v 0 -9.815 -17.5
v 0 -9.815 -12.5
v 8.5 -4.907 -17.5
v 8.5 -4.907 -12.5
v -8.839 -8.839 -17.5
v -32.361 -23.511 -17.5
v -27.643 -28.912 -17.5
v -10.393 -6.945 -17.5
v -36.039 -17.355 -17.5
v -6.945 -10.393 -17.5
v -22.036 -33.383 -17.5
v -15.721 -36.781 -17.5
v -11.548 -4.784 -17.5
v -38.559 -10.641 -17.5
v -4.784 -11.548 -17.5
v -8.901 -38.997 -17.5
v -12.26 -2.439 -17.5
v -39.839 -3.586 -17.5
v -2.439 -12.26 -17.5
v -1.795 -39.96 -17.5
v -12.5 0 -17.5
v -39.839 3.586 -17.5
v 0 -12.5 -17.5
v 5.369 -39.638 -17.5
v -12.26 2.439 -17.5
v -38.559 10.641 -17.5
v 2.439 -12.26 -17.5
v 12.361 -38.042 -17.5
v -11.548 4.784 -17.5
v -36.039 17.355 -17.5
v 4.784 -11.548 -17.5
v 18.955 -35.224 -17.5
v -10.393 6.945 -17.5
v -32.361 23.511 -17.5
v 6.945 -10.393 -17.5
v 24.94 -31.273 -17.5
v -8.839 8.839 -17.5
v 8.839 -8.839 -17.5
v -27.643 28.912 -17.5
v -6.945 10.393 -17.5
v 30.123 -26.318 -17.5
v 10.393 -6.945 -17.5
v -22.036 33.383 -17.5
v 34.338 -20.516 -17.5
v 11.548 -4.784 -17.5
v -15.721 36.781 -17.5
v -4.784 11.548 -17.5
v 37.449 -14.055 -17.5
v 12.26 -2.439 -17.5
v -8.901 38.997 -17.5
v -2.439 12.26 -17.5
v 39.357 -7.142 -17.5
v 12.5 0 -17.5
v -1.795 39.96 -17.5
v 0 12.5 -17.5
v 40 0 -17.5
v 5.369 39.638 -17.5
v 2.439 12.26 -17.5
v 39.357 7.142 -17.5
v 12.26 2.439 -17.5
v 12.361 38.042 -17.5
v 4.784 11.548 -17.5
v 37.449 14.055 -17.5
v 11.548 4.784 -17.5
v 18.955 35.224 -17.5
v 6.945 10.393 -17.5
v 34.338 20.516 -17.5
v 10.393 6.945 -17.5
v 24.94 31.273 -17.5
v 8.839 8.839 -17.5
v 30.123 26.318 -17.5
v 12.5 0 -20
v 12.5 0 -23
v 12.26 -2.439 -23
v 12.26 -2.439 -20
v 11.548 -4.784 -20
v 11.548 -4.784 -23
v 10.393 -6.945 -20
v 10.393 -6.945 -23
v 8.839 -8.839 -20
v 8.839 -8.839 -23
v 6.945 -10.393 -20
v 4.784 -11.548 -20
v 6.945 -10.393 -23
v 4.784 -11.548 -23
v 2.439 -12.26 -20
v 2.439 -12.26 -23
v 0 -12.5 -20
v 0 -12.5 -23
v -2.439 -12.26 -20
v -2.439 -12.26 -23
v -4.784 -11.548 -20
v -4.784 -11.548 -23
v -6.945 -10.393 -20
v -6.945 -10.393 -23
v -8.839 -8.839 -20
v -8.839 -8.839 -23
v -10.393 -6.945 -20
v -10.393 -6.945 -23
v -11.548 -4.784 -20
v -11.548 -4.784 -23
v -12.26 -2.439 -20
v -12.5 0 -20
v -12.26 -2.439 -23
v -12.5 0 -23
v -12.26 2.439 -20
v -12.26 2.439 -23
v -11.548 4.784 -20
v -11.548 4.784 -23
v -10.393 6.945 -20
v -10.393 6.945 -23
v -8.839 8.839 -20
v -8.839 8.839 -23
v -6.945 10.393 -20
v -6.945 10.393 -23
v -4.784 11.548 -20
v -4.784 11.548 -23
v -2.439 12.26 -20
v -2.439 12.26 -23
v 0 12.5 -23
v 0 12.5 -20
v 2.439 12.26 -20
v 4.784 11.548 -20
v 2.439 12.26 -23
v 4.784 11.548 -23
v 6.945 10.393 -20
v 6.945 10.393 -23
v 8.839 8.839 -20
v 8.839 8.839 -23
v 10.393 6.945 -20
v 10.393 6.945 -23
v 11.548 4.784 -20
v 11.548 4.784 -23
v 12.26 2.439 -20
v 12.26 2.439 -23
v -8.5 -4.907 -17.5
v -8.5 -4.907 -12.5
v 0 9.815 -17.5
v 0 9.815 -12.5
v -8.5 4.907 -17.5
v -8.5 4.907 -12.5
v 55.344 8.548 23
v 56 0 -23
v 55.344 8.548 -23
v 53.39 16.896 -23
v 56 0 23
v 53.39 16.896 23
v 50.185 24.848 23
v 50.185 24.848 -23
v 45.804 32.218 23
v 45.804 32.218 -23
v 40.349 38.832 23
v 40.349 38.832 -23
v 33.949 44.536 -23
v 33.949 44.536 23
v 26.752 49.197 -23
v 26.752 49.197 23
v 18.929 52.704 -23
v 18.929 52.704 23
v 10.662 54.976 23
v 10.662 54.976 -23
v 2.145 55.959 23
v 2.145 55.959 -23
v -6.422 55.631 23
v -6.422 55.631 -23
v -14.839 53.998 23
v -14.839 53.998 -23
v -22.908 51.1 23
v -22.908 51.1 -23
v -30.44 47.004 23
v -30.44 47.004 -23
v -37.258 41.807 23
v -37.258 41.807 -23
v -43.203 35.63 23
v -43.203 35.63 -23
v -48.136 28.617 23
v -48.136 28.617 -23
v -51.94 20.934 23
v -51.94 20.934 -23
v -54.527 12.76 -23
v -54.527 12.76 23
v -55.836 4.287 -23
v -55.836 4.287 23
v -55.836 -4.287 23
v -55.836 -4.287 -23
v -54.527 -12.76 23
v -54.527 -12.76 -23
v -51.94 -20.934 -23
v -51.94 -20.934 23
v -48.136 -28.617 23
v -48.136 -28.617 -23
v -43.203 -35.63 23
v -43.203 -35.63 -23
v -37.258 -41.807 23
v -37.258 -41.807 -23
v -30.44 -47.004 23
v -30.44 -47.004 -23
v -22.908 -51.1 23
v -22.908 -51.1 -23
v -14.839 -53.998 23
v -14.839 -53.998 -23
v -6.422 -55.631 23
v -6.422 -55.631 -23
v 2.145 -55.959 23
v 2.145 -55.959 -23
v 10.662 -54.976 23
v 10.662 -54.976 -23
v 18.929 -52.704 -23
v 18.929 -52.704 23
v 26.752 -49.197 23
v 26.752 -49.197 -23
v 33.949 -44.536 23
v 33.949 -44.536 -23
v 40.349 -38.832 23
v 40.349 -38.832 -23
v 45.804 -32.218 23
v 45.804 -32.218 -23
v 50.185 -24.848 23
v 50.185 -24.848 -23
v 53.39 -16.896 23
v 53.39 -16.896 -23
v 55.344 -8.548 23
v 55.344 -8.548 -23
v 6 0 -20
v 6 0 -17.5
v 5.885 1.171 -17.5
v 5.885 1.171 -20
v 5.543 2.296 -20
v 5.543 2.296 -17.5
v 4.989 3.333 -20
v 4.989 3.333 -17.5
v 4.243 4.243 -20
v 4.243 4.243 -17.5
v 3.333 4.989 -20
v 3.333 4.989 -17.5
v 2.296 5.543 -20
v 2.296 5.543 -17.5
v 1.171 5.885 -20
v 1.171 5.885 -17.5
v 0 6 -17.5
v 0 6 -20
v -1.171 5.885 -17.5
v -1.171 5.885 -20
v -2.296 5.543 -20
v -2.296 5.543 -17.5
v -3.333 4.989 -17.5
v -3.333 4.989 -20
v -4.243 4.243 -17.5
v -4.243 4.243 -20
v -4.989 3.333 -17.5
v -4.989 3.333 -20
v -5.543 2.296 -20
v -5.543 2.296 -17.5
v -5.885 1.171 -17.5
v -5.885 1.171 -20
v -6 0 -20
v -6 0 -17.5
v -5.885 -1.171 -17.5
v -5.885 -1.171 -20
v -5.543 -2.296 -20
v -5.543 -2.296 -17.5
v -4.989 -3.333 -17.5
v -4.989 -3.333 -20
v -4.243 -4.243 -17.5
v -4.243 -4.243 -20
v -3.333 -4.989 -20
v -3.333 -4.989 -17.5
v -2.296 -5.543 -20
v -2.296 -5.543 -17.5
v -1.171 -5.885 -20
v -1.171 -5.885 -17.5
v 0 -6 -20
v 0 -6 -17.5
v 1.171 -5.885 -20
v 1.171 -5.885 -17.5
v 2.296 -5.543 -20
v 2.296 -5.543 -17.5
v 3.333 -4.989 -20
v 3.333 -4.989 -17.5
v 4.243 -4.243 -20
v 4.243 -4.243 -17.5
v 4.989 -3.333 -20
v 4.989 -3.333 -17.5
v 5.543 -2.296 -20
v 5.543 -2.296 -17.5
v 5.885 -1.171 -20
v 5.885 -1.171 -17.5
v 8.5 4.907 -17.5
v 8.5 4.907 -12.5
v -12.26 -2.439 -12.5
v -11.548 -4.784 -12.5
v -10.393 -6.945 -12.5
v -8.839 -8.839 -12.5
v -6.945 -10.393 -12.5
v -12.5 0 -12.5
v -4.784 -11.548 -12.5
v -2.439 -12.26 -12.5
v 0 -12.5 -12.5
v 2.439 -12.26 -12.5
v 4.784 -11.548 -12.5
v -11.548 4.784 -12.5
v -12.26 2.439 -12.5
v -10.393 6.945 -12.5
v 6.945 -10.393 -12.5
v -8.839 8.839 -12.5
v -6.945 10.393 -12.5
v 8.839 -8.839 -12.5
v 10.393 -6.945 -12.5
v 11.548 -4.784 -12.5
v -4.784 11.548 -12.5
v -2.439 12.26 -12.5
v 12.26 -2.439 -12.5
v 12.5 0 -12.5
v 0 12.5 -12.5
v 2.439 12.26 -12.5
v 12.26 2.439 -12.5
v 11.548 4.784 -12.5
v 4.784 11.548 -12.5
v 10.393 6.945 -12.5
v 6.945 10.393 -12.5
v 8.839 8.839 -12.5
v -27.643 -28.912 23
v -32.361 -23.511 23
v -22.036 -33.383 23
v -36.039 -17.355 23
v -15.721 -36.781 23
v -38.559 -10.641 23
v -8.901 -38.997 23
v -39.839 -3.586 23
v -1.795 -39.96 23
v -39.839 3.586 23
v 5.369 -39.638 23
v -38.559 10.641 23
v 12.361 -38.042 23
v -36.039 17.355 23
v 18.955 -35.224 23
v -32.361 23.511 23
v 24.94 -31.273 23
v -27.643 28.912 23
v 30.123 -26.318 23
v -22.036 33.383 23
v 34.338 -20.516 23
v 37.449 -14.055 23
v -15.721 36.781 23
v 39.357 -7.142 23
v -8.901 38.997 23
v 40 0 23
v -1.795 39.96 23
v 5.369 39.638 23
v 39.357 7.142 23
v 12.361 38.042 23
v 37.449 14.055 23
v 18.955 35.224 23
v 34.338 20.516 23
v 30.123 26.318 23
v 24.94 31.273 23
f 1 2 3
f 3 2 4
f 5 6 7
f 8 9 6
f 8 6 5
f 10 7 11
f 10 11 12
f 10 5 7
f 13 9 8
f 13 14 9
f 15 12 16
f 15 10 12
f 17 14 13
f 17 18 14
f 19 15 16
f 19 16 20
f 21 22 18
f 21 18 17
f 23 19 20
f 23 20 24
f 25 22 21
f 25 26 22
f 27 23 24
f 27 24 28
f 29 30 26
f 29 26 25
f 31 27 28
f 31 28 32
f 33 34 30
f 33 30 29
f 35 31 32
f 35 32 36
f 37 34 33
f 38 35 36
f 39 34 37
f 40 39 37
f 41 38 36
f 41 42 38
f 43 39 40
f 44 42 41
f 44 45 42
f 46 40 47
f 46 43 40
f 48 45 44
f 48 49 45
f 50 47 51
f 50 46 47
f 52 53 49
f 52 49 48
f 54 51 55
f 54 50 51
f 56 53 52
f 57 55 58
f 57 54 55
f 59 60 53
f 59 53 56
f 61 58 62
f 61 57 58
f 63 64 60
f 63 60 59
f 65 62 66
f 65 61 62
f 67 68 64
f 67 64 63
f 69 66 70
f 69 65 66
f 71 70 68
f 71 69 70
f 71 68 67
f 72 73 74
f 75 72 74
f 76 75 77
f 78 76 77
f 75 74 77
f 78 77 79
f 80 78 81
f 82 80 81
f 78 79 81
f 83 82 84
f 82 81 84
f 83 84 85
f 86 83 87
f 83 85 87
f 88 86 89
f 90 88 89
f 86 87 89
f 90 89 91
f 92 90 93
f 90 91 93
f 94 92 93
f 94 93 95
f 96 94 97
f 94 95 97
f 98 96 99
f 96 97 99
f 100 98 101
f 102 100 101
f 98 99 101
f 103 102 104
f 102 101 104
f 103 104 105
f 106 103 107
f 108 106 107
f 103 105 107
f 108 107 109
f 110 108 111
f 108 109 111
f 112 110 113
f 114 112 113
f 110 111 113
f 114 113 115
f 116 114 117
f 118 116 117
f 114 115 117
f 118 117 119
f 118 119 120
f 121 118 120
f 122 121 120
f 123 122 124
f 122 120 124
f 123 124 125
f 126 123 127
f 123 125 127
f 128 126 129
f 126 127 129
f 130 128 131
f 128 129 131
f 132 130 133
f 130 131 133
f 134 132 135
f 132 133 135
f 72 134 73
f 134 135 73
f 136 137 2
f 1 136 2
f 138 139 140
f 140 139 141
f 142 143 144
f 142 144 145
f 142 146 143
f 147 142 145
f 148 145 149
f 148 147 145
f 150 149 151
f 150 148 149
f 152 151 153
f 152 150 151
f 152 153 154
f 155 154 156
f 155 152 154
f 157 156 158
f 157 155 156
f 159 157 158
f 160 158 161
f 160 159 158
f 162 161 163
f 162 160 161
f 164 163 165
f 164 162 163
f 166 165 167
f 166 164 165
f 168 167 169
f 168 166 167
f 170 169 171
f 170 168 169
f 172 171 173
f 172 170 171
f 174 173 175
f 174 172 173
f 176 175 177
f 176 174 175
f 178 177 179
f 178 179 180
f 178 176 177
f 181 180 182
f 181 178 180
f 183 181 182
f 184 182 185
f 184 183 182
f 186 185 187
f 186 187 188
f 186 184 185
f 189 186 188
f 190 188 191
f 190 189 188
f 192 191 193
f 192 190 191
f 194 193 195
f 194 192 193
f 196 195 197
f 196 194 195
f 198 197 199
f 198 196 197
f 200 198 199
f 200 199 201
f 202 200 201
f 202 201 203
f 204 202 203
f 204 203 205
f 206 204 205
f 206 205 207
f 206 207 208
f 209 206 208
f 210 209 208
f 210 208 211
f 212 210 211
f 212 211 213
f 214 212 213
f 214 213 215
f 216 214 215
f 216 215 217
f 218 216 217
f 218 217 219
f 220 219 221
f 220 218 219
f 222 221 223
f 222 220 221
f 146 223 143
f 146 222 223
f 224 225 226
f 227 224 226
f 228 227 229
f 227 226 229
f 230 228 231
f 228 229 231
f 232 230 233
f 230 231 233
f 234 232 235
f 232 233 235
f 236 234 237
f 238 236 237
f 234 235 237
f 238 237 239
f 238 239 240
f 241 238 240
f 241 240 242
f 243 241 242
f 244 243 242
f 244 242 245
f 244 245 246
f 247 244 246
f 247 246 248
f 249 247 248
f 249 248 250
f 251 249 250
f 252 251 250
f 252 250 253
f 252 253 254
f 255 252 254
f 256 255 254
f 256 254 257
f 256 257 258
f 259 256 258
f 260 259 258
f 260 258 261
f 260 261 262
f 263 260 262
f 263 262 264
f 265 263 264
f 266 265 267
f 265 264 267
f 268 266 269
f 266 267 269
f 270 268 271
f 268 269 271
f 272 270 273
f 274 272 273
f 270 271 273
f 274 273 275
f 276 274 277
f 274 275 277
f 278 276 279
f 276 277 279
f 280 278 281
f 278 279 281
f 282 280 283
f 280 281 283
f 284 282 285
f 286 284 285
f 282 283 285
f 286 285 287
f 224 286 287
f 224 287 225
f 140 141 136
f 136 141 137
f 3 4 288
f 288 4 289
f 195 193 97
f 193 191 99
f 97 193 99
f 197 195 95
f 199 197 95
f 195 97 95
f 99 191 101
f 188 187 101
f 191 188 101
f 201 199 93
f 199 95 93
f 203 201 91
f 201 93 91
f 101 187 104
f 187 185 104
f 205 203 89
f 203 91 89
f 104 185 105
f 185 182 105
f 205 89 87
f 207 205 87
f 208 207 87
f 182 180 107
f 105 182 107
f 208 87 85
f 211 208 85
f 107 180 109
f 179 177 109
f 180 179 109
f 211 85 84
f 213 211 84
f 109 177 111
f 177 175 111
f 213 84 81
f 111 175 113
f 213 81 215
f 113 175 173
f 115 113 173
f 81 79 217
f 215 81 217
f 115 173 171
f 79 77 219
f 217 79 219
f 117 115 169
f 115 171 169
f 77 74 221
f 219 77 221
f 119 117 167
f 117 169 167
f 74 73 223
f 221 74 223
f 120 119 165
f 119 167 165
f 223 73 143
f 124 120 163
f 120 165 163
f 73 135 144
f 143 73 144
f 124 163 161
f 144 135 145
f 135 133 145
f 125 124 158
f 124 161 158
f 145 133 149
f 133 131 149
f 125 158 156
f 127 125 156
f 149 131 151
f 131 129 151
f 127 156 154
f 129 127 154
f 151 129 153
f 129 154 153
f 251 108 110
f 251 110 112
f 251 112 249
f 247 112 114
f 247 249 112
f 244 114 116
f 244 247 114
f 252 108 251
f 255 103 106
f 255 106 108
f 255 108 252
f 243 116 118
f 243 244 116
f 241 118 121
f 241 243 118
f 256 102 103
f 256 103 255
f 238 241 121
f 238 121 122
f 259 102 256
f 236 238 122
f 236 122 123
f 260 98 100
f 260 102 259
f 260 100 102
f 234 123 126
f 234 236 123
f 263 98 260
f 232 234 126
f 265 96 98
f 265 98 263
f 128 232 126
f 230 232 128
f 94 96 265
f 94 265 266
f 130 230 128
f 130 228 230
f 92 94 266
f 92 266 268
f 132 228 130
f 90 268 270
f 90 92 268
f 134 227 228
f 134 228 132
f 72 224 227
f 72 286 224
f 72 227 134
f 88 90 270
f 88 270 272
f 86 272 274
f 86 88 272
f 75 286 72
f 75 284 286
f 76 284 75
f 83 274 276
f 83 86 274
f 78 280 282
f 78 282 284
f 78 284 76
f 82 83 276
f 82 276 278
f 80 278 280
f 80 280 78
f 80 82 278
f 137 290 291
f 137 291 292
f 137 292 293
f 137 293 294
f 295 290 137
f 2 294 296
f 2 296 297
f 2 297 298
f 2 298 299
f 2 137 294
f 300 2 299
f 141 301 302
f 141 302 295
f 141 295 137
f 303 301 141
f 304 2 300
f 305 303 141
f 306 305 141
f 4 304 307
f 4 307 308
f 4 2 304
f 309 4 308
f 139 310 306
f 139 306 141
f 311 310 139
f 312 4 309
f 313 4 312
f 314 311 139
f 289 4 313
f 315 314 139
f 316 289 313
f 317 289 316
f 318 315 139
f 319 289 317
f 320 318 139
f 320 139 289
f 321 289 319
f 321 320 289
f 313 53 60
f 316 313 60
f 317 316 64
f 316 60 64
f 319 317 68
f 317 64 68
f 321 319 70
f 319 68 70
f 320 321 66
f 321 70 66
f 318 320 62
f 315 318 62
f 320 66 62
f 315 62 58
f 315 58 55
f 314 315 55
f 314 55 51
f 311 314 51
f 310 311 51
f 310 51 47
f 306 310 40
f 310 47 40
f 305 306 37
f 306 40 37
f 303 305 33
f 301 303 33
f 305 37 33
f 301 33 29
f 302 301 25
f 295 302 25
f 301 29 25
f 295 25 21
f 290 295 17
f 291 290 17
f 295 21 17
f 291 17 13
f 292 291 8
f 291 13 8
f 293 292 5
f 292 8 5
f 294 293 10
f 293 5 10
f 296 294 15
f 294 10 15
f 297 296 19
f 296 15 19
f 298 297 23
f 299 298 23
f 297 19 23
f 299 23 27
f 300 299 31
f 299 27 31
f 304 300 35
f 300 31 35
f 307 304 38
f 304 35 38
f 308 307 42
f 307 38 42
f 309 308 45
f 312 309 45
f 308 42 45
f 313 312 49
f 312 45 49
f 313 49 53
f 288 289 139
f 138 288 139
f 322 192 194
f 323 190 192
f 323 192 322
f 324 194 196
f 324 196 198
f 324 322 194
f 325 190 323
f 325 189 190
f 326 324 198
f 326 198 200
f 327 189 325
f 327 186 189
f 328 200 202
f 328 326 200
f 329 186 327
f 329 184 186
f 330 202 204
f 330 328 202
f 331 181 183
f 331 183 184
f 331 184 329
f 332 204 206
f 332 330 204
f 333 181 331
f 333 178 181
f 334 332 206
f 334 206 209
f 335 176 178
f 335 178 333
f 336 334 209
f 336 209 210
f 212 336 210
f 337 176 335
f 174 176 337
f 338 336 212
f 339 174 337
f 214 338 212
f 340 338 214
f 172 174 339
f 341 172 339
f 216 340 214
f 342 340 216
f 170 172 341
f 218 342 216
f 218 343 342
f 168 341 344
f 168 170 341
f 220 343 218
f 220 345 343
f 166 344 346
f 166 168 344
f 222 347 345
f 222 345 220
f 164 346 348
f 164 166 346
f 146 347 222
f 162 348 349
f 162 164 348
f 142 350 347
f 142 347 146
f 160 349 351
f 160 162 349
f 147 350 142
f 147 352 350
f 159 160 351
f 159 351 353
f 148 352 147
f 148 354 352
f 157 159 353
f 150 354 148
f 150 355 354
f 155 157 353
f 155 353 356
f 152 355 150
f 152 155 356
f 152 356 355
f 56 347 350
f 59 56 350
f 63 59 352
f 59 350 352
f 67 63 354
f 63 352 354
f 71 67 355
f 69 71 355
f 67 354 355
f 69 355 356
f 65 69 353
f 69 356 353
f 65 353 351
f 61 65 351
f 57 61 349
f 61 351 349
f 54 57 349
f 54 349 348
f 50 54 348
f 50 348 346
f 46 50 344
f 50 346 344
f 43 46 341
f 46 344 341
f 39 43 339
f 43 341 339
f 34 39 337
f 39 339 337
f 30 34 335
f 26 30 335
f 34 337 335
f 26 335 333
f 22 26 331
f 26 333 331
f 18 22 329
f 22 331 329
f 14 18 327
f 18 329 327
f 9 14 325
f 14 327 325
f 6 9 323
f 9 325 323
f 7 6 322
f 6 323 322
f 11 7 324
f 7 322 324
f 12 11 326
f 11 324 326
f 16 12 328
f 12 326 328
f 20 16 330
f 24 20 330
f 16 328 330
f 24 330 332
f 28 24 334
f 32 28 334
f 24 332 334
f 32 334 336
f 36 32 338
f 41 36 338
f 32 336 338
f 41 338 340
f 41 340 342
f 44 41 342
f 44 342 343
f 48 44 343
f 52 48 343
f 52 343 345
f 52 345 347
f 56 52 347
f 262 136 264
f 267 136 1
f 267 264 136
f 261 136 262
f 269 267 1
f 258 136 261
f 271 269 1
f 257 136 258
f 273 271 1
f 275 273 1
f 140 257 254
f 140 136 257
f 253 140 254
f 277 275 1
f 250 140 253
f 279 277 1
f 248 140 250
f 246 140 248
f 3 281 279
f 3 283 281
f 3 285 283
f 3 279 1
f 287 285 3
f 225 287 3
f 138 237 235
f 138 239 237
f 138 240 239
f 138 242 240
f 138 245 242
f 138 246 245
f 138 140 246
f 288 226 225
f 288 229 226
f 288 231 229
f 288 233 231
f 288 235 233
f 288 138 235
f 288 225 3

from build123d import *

# Parameters (mm, degrees)
CROQUIS1_R              = 56
SALIENTE_EXTRUIR1_DEPTH = 23
CROQUIS2_R              = 40
CORTAR_EXTRUIR1_DEPTH   = 40.5
CROQUIS3_R              = 12.5
SALIENTE_EXTRUIR2_DEPTH = 5
CORTAR_EXTRUIR2_DEPTH   = 5
CROQUIS5_R              = 6
CORTAR_EXTRUIR3_DEPTH   = 89.950829114
CROQUIS6_R              = 12.5
CORTAR_EXTRUIR4_DEPTH   = 3


with BuildPart() as part:
    # Croquis1 → Saliente-Extruir1 (new, symmetric)
    with BuildSketch(Plane.XY):
        Circle(CROQUIS1_R)
    extrude(amount=SALIENTE_EXTRUIR1_DEPTH, both=True)

    # Croquis2 → Cortar-Extruir1 (cut)
    with BuildSketch(Plane.XY.offset(23)):
        Circle(CROQUIS2_R)
    extrude(amount=-CORTAR_EXTRUIR1_DEPTH, mode=Mode.SUBTRACT)

    # Croquis3 → Saliente-Extruir2 (add)
    with BuildSketch(Plane.XY.offset(-17.5)):
        Circle(CROQUIS3_R)
    extrude(amount=SALIENTE_EXTRUIR2_DEPTH)

    # Croquis4 → Cortar-Extruir2 (cut)
    with BuildSketch(Plane.XY.offset(-12.5)):
        Polygon((0, 9.814954576), (-8.5, 4.907477288), (-8.5, -4.907477288), (0, -9.814954576), (8.5, -4.907477288), (8.5, 4.907477288), align=None)
    extrude(amount=-CORTAR_EXTRUIR2_DEPTH, mode=Mode.SUBTRACT)

    # Croquis5 → Cortar-Extruir3 (cut, through all)
    with BuildSketch(Plane.XY.offset(-17.5)):
        Circle(CROQUIS5_R)
    extrude(amount=-CORTAR_EXTRUIR3_DEPTH, mode=Mode.SUBTRACT)

    # Croquis6 → Cortar-Extruir4 (cut)
    with BuildSketch(Plane(origin=(0, 0, -23), x_dir=(-1, 0, 0), z_dir=(0, 0, -1))):
        Circle(CROQUIS6_R)
    extrude(amount=-CORTAR_EXTRUIR4_DEPTH, mode=Mode.SUBTRACT)


solid = part.part
